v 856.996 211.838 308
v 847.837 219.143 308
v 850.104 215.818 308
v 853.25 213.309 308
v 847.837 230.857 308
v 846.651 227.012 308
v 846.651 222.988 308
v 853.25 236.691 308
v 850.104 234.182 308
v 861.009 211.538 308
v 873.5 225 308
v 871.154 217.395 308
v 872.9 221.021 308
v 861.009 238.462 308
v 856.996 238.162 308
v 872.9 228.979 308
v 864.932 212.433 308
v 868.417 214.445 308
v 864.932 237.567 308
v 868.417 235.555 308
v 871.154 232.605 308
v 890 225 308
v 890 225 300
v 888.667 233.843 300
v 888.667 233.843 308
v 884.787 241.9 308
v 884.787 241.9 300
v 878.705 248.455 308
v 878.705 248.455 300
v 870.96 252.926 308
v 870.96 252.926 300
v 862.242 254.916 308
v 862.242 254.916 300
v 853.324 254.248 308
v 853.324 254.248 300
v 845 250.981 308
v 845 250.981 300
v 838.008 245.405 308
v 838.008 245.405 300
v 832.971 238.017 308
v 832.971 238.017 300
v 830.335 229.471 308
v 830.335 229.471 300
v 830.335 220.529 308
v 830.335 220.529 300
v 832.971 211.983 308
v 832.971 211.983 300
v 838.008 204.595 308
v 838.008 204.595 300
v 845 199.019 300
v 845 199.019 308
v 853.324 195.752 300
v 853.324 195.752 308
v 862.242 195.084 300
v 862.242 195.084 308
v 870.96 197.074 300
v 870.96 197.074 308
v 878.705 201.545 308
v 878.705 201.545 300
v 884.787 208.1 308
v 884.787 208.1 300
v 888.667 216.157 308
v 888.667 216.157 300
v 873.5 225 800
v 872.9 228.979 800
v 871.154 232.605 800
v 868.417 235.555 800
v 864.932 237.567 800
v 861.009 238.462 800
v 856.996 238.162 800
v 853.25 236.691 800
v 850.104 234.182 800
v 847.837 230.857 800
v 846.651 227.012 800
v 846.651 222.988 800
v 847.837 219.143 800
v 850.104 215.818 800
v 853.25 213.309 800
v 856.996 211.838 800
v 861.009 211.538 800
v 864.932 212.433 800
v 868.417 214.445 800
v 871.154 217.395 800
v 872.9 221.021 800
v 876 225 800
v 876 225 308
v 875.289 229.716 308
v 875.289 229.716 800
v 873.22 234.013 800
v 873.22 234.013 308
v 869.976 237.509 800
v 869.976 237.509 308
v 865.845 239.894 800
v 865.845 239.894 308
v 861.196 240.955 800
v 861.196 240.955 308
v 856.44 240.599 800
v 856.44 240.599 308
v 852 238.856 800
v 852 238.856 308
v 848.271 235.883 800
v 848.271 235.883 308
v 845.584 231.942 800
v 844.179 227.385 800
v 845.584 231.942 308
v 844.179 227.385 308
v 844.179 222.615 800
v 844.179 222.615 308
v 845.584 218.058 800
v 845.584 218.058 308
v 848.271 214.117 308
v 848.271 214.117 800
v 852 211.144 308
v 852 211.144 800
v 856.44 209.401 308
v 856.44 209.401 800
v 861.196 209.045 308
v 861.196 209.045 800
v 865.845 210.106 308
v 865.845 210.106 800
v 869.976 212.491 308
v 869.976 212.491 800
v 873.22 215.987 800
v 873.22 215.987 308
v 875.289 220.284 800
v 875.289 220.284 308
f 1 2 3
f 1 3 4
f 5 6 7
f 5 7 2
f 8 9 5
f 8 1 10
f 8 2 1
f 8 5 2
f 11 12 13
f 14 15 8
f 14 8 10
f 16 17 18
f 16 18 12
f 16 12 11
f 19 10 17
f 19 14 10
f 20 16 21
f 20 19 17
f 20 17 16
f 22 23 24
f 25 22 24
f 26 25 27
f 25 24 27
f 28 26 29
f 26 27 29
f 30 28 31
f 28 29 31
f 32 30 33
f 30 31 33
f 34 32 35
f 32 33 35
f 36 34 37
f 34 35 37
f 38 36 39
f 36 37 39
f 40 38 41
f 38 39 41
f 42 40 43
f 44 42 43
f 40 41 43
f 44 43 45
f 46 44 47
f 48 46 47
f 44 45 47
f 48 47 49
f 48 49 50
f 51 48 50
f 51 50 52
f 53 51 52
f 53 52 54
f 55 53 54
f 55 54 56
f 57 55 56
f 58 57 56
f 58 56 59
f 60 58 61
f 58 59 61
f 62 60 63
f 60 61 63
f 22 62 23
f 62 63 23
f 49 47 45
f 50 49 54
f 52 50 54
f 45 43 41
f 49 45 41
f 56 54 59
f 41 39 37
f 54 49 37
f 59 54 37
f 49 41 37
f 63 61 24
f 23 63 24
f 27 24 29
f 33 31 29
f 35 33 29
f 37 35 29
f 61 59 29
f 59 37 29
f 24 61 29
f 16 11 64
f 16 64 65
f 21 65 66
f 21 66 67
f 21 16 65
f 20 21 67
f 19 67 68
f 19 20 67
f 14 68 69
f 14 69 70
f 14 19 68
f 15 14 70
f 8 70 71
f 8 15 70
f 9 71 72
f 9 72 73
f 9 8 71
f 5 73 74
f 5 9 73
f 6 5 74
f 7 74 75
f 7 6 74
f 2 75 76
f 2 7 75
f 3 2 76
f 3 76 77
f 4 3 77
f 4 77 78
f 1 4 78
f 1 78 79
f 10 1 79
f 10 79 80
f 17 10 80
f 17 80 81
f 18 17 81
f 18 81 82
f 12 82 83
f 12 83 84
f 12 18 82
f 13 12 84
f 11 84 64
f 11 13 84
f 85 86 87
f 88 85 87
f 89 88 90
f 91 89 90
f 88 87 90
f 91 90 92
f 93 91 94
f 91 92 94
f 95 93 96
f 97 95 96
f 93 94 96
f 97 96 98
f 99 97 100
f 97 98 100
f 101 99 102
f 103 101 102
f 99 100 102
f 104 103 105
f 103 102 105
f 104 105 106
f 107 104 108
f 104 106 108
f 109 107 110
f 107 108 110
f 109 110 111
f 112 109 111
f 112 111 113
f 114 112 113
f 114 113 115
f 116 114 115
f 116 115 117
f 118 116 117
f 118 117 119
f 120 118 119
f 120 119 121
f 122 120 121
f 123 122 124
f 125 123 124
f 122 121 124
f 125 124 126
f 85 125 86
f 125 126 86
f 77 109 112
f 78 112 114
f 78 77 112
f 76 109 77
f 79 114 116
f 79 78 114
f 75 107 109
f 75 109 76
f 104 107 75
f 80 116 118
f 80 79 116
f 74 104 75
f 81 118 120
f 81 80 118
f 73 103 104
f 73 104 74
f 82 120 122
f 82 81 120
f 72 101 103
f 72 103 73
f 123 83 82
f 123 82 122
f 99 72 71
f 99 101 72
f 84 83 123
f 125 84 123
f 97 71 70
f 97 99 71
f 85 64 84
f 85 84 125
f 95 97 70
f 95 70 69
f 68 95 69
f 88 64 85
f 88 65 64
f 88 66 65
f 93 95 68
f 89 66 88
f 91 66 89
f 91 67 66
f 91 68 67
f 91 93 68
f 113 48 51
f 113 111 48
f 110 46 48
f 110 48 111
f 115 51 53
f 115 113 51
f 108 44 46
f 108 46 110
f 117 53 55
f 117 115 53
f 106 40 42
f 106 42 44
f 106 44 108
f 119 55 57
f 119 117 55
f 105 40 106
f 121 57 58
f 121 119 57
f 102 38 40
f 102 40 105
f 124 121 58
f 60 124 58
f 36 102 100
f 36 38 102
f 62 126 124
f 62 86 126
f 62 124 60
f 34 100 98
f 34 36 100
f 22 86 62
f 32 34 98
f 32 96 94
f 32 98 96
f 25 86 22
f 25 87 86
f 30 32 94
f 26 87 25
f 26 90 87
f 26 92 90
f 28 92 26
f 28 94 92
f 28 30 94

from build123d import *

# Parameters (mm, degrees)
EXTRUDE_START        = 300
EXTRUDE_SKETCH_1_R   = 30
EXTRUDE_1_DEPTH      = 8
EXTRUDE_START_2      = 308
EXTRUDE_SKETCH_2_R   = 16
EXTRUDE_SKETCH_2_R_2 = 13.5
EXTRUDE_2_DEPTH      = 492


with BuildPart() as part:
    # Extrude sketch 1 → Extrude 1 (new body)
    with BuildSketch(Plane.XY.offset(EXTRUDE_START)):
        with Locations((860, 225)):
            Circle(EXTRUDE_SKETCH_1_R)
    extrude(amount=EXTRUDE_1_DEPTH)


with BuildPart() as body_2:
    # Extrude sketch 2 → Extrude 2 (new body)
    with BuildSketch(Plane.XY.offset(EXTRUDE_START_2)):
        with Locations((860, 225)):
            Circle(EXTRUDE_SKETCH_2_R)
        with Locations((860, 225)):
            Circle(EXTRUDE_SKETCH_2_R_2, mode=Mode.SUBTRACT)
    extrude(amount=EXTRUDE_2_DEPTH)


with BuildPart() as part_1:
    add(part.part)

    # Combine (weld / assembly of features): union body 2
    add(body_2.part)


solid = part_1.part
